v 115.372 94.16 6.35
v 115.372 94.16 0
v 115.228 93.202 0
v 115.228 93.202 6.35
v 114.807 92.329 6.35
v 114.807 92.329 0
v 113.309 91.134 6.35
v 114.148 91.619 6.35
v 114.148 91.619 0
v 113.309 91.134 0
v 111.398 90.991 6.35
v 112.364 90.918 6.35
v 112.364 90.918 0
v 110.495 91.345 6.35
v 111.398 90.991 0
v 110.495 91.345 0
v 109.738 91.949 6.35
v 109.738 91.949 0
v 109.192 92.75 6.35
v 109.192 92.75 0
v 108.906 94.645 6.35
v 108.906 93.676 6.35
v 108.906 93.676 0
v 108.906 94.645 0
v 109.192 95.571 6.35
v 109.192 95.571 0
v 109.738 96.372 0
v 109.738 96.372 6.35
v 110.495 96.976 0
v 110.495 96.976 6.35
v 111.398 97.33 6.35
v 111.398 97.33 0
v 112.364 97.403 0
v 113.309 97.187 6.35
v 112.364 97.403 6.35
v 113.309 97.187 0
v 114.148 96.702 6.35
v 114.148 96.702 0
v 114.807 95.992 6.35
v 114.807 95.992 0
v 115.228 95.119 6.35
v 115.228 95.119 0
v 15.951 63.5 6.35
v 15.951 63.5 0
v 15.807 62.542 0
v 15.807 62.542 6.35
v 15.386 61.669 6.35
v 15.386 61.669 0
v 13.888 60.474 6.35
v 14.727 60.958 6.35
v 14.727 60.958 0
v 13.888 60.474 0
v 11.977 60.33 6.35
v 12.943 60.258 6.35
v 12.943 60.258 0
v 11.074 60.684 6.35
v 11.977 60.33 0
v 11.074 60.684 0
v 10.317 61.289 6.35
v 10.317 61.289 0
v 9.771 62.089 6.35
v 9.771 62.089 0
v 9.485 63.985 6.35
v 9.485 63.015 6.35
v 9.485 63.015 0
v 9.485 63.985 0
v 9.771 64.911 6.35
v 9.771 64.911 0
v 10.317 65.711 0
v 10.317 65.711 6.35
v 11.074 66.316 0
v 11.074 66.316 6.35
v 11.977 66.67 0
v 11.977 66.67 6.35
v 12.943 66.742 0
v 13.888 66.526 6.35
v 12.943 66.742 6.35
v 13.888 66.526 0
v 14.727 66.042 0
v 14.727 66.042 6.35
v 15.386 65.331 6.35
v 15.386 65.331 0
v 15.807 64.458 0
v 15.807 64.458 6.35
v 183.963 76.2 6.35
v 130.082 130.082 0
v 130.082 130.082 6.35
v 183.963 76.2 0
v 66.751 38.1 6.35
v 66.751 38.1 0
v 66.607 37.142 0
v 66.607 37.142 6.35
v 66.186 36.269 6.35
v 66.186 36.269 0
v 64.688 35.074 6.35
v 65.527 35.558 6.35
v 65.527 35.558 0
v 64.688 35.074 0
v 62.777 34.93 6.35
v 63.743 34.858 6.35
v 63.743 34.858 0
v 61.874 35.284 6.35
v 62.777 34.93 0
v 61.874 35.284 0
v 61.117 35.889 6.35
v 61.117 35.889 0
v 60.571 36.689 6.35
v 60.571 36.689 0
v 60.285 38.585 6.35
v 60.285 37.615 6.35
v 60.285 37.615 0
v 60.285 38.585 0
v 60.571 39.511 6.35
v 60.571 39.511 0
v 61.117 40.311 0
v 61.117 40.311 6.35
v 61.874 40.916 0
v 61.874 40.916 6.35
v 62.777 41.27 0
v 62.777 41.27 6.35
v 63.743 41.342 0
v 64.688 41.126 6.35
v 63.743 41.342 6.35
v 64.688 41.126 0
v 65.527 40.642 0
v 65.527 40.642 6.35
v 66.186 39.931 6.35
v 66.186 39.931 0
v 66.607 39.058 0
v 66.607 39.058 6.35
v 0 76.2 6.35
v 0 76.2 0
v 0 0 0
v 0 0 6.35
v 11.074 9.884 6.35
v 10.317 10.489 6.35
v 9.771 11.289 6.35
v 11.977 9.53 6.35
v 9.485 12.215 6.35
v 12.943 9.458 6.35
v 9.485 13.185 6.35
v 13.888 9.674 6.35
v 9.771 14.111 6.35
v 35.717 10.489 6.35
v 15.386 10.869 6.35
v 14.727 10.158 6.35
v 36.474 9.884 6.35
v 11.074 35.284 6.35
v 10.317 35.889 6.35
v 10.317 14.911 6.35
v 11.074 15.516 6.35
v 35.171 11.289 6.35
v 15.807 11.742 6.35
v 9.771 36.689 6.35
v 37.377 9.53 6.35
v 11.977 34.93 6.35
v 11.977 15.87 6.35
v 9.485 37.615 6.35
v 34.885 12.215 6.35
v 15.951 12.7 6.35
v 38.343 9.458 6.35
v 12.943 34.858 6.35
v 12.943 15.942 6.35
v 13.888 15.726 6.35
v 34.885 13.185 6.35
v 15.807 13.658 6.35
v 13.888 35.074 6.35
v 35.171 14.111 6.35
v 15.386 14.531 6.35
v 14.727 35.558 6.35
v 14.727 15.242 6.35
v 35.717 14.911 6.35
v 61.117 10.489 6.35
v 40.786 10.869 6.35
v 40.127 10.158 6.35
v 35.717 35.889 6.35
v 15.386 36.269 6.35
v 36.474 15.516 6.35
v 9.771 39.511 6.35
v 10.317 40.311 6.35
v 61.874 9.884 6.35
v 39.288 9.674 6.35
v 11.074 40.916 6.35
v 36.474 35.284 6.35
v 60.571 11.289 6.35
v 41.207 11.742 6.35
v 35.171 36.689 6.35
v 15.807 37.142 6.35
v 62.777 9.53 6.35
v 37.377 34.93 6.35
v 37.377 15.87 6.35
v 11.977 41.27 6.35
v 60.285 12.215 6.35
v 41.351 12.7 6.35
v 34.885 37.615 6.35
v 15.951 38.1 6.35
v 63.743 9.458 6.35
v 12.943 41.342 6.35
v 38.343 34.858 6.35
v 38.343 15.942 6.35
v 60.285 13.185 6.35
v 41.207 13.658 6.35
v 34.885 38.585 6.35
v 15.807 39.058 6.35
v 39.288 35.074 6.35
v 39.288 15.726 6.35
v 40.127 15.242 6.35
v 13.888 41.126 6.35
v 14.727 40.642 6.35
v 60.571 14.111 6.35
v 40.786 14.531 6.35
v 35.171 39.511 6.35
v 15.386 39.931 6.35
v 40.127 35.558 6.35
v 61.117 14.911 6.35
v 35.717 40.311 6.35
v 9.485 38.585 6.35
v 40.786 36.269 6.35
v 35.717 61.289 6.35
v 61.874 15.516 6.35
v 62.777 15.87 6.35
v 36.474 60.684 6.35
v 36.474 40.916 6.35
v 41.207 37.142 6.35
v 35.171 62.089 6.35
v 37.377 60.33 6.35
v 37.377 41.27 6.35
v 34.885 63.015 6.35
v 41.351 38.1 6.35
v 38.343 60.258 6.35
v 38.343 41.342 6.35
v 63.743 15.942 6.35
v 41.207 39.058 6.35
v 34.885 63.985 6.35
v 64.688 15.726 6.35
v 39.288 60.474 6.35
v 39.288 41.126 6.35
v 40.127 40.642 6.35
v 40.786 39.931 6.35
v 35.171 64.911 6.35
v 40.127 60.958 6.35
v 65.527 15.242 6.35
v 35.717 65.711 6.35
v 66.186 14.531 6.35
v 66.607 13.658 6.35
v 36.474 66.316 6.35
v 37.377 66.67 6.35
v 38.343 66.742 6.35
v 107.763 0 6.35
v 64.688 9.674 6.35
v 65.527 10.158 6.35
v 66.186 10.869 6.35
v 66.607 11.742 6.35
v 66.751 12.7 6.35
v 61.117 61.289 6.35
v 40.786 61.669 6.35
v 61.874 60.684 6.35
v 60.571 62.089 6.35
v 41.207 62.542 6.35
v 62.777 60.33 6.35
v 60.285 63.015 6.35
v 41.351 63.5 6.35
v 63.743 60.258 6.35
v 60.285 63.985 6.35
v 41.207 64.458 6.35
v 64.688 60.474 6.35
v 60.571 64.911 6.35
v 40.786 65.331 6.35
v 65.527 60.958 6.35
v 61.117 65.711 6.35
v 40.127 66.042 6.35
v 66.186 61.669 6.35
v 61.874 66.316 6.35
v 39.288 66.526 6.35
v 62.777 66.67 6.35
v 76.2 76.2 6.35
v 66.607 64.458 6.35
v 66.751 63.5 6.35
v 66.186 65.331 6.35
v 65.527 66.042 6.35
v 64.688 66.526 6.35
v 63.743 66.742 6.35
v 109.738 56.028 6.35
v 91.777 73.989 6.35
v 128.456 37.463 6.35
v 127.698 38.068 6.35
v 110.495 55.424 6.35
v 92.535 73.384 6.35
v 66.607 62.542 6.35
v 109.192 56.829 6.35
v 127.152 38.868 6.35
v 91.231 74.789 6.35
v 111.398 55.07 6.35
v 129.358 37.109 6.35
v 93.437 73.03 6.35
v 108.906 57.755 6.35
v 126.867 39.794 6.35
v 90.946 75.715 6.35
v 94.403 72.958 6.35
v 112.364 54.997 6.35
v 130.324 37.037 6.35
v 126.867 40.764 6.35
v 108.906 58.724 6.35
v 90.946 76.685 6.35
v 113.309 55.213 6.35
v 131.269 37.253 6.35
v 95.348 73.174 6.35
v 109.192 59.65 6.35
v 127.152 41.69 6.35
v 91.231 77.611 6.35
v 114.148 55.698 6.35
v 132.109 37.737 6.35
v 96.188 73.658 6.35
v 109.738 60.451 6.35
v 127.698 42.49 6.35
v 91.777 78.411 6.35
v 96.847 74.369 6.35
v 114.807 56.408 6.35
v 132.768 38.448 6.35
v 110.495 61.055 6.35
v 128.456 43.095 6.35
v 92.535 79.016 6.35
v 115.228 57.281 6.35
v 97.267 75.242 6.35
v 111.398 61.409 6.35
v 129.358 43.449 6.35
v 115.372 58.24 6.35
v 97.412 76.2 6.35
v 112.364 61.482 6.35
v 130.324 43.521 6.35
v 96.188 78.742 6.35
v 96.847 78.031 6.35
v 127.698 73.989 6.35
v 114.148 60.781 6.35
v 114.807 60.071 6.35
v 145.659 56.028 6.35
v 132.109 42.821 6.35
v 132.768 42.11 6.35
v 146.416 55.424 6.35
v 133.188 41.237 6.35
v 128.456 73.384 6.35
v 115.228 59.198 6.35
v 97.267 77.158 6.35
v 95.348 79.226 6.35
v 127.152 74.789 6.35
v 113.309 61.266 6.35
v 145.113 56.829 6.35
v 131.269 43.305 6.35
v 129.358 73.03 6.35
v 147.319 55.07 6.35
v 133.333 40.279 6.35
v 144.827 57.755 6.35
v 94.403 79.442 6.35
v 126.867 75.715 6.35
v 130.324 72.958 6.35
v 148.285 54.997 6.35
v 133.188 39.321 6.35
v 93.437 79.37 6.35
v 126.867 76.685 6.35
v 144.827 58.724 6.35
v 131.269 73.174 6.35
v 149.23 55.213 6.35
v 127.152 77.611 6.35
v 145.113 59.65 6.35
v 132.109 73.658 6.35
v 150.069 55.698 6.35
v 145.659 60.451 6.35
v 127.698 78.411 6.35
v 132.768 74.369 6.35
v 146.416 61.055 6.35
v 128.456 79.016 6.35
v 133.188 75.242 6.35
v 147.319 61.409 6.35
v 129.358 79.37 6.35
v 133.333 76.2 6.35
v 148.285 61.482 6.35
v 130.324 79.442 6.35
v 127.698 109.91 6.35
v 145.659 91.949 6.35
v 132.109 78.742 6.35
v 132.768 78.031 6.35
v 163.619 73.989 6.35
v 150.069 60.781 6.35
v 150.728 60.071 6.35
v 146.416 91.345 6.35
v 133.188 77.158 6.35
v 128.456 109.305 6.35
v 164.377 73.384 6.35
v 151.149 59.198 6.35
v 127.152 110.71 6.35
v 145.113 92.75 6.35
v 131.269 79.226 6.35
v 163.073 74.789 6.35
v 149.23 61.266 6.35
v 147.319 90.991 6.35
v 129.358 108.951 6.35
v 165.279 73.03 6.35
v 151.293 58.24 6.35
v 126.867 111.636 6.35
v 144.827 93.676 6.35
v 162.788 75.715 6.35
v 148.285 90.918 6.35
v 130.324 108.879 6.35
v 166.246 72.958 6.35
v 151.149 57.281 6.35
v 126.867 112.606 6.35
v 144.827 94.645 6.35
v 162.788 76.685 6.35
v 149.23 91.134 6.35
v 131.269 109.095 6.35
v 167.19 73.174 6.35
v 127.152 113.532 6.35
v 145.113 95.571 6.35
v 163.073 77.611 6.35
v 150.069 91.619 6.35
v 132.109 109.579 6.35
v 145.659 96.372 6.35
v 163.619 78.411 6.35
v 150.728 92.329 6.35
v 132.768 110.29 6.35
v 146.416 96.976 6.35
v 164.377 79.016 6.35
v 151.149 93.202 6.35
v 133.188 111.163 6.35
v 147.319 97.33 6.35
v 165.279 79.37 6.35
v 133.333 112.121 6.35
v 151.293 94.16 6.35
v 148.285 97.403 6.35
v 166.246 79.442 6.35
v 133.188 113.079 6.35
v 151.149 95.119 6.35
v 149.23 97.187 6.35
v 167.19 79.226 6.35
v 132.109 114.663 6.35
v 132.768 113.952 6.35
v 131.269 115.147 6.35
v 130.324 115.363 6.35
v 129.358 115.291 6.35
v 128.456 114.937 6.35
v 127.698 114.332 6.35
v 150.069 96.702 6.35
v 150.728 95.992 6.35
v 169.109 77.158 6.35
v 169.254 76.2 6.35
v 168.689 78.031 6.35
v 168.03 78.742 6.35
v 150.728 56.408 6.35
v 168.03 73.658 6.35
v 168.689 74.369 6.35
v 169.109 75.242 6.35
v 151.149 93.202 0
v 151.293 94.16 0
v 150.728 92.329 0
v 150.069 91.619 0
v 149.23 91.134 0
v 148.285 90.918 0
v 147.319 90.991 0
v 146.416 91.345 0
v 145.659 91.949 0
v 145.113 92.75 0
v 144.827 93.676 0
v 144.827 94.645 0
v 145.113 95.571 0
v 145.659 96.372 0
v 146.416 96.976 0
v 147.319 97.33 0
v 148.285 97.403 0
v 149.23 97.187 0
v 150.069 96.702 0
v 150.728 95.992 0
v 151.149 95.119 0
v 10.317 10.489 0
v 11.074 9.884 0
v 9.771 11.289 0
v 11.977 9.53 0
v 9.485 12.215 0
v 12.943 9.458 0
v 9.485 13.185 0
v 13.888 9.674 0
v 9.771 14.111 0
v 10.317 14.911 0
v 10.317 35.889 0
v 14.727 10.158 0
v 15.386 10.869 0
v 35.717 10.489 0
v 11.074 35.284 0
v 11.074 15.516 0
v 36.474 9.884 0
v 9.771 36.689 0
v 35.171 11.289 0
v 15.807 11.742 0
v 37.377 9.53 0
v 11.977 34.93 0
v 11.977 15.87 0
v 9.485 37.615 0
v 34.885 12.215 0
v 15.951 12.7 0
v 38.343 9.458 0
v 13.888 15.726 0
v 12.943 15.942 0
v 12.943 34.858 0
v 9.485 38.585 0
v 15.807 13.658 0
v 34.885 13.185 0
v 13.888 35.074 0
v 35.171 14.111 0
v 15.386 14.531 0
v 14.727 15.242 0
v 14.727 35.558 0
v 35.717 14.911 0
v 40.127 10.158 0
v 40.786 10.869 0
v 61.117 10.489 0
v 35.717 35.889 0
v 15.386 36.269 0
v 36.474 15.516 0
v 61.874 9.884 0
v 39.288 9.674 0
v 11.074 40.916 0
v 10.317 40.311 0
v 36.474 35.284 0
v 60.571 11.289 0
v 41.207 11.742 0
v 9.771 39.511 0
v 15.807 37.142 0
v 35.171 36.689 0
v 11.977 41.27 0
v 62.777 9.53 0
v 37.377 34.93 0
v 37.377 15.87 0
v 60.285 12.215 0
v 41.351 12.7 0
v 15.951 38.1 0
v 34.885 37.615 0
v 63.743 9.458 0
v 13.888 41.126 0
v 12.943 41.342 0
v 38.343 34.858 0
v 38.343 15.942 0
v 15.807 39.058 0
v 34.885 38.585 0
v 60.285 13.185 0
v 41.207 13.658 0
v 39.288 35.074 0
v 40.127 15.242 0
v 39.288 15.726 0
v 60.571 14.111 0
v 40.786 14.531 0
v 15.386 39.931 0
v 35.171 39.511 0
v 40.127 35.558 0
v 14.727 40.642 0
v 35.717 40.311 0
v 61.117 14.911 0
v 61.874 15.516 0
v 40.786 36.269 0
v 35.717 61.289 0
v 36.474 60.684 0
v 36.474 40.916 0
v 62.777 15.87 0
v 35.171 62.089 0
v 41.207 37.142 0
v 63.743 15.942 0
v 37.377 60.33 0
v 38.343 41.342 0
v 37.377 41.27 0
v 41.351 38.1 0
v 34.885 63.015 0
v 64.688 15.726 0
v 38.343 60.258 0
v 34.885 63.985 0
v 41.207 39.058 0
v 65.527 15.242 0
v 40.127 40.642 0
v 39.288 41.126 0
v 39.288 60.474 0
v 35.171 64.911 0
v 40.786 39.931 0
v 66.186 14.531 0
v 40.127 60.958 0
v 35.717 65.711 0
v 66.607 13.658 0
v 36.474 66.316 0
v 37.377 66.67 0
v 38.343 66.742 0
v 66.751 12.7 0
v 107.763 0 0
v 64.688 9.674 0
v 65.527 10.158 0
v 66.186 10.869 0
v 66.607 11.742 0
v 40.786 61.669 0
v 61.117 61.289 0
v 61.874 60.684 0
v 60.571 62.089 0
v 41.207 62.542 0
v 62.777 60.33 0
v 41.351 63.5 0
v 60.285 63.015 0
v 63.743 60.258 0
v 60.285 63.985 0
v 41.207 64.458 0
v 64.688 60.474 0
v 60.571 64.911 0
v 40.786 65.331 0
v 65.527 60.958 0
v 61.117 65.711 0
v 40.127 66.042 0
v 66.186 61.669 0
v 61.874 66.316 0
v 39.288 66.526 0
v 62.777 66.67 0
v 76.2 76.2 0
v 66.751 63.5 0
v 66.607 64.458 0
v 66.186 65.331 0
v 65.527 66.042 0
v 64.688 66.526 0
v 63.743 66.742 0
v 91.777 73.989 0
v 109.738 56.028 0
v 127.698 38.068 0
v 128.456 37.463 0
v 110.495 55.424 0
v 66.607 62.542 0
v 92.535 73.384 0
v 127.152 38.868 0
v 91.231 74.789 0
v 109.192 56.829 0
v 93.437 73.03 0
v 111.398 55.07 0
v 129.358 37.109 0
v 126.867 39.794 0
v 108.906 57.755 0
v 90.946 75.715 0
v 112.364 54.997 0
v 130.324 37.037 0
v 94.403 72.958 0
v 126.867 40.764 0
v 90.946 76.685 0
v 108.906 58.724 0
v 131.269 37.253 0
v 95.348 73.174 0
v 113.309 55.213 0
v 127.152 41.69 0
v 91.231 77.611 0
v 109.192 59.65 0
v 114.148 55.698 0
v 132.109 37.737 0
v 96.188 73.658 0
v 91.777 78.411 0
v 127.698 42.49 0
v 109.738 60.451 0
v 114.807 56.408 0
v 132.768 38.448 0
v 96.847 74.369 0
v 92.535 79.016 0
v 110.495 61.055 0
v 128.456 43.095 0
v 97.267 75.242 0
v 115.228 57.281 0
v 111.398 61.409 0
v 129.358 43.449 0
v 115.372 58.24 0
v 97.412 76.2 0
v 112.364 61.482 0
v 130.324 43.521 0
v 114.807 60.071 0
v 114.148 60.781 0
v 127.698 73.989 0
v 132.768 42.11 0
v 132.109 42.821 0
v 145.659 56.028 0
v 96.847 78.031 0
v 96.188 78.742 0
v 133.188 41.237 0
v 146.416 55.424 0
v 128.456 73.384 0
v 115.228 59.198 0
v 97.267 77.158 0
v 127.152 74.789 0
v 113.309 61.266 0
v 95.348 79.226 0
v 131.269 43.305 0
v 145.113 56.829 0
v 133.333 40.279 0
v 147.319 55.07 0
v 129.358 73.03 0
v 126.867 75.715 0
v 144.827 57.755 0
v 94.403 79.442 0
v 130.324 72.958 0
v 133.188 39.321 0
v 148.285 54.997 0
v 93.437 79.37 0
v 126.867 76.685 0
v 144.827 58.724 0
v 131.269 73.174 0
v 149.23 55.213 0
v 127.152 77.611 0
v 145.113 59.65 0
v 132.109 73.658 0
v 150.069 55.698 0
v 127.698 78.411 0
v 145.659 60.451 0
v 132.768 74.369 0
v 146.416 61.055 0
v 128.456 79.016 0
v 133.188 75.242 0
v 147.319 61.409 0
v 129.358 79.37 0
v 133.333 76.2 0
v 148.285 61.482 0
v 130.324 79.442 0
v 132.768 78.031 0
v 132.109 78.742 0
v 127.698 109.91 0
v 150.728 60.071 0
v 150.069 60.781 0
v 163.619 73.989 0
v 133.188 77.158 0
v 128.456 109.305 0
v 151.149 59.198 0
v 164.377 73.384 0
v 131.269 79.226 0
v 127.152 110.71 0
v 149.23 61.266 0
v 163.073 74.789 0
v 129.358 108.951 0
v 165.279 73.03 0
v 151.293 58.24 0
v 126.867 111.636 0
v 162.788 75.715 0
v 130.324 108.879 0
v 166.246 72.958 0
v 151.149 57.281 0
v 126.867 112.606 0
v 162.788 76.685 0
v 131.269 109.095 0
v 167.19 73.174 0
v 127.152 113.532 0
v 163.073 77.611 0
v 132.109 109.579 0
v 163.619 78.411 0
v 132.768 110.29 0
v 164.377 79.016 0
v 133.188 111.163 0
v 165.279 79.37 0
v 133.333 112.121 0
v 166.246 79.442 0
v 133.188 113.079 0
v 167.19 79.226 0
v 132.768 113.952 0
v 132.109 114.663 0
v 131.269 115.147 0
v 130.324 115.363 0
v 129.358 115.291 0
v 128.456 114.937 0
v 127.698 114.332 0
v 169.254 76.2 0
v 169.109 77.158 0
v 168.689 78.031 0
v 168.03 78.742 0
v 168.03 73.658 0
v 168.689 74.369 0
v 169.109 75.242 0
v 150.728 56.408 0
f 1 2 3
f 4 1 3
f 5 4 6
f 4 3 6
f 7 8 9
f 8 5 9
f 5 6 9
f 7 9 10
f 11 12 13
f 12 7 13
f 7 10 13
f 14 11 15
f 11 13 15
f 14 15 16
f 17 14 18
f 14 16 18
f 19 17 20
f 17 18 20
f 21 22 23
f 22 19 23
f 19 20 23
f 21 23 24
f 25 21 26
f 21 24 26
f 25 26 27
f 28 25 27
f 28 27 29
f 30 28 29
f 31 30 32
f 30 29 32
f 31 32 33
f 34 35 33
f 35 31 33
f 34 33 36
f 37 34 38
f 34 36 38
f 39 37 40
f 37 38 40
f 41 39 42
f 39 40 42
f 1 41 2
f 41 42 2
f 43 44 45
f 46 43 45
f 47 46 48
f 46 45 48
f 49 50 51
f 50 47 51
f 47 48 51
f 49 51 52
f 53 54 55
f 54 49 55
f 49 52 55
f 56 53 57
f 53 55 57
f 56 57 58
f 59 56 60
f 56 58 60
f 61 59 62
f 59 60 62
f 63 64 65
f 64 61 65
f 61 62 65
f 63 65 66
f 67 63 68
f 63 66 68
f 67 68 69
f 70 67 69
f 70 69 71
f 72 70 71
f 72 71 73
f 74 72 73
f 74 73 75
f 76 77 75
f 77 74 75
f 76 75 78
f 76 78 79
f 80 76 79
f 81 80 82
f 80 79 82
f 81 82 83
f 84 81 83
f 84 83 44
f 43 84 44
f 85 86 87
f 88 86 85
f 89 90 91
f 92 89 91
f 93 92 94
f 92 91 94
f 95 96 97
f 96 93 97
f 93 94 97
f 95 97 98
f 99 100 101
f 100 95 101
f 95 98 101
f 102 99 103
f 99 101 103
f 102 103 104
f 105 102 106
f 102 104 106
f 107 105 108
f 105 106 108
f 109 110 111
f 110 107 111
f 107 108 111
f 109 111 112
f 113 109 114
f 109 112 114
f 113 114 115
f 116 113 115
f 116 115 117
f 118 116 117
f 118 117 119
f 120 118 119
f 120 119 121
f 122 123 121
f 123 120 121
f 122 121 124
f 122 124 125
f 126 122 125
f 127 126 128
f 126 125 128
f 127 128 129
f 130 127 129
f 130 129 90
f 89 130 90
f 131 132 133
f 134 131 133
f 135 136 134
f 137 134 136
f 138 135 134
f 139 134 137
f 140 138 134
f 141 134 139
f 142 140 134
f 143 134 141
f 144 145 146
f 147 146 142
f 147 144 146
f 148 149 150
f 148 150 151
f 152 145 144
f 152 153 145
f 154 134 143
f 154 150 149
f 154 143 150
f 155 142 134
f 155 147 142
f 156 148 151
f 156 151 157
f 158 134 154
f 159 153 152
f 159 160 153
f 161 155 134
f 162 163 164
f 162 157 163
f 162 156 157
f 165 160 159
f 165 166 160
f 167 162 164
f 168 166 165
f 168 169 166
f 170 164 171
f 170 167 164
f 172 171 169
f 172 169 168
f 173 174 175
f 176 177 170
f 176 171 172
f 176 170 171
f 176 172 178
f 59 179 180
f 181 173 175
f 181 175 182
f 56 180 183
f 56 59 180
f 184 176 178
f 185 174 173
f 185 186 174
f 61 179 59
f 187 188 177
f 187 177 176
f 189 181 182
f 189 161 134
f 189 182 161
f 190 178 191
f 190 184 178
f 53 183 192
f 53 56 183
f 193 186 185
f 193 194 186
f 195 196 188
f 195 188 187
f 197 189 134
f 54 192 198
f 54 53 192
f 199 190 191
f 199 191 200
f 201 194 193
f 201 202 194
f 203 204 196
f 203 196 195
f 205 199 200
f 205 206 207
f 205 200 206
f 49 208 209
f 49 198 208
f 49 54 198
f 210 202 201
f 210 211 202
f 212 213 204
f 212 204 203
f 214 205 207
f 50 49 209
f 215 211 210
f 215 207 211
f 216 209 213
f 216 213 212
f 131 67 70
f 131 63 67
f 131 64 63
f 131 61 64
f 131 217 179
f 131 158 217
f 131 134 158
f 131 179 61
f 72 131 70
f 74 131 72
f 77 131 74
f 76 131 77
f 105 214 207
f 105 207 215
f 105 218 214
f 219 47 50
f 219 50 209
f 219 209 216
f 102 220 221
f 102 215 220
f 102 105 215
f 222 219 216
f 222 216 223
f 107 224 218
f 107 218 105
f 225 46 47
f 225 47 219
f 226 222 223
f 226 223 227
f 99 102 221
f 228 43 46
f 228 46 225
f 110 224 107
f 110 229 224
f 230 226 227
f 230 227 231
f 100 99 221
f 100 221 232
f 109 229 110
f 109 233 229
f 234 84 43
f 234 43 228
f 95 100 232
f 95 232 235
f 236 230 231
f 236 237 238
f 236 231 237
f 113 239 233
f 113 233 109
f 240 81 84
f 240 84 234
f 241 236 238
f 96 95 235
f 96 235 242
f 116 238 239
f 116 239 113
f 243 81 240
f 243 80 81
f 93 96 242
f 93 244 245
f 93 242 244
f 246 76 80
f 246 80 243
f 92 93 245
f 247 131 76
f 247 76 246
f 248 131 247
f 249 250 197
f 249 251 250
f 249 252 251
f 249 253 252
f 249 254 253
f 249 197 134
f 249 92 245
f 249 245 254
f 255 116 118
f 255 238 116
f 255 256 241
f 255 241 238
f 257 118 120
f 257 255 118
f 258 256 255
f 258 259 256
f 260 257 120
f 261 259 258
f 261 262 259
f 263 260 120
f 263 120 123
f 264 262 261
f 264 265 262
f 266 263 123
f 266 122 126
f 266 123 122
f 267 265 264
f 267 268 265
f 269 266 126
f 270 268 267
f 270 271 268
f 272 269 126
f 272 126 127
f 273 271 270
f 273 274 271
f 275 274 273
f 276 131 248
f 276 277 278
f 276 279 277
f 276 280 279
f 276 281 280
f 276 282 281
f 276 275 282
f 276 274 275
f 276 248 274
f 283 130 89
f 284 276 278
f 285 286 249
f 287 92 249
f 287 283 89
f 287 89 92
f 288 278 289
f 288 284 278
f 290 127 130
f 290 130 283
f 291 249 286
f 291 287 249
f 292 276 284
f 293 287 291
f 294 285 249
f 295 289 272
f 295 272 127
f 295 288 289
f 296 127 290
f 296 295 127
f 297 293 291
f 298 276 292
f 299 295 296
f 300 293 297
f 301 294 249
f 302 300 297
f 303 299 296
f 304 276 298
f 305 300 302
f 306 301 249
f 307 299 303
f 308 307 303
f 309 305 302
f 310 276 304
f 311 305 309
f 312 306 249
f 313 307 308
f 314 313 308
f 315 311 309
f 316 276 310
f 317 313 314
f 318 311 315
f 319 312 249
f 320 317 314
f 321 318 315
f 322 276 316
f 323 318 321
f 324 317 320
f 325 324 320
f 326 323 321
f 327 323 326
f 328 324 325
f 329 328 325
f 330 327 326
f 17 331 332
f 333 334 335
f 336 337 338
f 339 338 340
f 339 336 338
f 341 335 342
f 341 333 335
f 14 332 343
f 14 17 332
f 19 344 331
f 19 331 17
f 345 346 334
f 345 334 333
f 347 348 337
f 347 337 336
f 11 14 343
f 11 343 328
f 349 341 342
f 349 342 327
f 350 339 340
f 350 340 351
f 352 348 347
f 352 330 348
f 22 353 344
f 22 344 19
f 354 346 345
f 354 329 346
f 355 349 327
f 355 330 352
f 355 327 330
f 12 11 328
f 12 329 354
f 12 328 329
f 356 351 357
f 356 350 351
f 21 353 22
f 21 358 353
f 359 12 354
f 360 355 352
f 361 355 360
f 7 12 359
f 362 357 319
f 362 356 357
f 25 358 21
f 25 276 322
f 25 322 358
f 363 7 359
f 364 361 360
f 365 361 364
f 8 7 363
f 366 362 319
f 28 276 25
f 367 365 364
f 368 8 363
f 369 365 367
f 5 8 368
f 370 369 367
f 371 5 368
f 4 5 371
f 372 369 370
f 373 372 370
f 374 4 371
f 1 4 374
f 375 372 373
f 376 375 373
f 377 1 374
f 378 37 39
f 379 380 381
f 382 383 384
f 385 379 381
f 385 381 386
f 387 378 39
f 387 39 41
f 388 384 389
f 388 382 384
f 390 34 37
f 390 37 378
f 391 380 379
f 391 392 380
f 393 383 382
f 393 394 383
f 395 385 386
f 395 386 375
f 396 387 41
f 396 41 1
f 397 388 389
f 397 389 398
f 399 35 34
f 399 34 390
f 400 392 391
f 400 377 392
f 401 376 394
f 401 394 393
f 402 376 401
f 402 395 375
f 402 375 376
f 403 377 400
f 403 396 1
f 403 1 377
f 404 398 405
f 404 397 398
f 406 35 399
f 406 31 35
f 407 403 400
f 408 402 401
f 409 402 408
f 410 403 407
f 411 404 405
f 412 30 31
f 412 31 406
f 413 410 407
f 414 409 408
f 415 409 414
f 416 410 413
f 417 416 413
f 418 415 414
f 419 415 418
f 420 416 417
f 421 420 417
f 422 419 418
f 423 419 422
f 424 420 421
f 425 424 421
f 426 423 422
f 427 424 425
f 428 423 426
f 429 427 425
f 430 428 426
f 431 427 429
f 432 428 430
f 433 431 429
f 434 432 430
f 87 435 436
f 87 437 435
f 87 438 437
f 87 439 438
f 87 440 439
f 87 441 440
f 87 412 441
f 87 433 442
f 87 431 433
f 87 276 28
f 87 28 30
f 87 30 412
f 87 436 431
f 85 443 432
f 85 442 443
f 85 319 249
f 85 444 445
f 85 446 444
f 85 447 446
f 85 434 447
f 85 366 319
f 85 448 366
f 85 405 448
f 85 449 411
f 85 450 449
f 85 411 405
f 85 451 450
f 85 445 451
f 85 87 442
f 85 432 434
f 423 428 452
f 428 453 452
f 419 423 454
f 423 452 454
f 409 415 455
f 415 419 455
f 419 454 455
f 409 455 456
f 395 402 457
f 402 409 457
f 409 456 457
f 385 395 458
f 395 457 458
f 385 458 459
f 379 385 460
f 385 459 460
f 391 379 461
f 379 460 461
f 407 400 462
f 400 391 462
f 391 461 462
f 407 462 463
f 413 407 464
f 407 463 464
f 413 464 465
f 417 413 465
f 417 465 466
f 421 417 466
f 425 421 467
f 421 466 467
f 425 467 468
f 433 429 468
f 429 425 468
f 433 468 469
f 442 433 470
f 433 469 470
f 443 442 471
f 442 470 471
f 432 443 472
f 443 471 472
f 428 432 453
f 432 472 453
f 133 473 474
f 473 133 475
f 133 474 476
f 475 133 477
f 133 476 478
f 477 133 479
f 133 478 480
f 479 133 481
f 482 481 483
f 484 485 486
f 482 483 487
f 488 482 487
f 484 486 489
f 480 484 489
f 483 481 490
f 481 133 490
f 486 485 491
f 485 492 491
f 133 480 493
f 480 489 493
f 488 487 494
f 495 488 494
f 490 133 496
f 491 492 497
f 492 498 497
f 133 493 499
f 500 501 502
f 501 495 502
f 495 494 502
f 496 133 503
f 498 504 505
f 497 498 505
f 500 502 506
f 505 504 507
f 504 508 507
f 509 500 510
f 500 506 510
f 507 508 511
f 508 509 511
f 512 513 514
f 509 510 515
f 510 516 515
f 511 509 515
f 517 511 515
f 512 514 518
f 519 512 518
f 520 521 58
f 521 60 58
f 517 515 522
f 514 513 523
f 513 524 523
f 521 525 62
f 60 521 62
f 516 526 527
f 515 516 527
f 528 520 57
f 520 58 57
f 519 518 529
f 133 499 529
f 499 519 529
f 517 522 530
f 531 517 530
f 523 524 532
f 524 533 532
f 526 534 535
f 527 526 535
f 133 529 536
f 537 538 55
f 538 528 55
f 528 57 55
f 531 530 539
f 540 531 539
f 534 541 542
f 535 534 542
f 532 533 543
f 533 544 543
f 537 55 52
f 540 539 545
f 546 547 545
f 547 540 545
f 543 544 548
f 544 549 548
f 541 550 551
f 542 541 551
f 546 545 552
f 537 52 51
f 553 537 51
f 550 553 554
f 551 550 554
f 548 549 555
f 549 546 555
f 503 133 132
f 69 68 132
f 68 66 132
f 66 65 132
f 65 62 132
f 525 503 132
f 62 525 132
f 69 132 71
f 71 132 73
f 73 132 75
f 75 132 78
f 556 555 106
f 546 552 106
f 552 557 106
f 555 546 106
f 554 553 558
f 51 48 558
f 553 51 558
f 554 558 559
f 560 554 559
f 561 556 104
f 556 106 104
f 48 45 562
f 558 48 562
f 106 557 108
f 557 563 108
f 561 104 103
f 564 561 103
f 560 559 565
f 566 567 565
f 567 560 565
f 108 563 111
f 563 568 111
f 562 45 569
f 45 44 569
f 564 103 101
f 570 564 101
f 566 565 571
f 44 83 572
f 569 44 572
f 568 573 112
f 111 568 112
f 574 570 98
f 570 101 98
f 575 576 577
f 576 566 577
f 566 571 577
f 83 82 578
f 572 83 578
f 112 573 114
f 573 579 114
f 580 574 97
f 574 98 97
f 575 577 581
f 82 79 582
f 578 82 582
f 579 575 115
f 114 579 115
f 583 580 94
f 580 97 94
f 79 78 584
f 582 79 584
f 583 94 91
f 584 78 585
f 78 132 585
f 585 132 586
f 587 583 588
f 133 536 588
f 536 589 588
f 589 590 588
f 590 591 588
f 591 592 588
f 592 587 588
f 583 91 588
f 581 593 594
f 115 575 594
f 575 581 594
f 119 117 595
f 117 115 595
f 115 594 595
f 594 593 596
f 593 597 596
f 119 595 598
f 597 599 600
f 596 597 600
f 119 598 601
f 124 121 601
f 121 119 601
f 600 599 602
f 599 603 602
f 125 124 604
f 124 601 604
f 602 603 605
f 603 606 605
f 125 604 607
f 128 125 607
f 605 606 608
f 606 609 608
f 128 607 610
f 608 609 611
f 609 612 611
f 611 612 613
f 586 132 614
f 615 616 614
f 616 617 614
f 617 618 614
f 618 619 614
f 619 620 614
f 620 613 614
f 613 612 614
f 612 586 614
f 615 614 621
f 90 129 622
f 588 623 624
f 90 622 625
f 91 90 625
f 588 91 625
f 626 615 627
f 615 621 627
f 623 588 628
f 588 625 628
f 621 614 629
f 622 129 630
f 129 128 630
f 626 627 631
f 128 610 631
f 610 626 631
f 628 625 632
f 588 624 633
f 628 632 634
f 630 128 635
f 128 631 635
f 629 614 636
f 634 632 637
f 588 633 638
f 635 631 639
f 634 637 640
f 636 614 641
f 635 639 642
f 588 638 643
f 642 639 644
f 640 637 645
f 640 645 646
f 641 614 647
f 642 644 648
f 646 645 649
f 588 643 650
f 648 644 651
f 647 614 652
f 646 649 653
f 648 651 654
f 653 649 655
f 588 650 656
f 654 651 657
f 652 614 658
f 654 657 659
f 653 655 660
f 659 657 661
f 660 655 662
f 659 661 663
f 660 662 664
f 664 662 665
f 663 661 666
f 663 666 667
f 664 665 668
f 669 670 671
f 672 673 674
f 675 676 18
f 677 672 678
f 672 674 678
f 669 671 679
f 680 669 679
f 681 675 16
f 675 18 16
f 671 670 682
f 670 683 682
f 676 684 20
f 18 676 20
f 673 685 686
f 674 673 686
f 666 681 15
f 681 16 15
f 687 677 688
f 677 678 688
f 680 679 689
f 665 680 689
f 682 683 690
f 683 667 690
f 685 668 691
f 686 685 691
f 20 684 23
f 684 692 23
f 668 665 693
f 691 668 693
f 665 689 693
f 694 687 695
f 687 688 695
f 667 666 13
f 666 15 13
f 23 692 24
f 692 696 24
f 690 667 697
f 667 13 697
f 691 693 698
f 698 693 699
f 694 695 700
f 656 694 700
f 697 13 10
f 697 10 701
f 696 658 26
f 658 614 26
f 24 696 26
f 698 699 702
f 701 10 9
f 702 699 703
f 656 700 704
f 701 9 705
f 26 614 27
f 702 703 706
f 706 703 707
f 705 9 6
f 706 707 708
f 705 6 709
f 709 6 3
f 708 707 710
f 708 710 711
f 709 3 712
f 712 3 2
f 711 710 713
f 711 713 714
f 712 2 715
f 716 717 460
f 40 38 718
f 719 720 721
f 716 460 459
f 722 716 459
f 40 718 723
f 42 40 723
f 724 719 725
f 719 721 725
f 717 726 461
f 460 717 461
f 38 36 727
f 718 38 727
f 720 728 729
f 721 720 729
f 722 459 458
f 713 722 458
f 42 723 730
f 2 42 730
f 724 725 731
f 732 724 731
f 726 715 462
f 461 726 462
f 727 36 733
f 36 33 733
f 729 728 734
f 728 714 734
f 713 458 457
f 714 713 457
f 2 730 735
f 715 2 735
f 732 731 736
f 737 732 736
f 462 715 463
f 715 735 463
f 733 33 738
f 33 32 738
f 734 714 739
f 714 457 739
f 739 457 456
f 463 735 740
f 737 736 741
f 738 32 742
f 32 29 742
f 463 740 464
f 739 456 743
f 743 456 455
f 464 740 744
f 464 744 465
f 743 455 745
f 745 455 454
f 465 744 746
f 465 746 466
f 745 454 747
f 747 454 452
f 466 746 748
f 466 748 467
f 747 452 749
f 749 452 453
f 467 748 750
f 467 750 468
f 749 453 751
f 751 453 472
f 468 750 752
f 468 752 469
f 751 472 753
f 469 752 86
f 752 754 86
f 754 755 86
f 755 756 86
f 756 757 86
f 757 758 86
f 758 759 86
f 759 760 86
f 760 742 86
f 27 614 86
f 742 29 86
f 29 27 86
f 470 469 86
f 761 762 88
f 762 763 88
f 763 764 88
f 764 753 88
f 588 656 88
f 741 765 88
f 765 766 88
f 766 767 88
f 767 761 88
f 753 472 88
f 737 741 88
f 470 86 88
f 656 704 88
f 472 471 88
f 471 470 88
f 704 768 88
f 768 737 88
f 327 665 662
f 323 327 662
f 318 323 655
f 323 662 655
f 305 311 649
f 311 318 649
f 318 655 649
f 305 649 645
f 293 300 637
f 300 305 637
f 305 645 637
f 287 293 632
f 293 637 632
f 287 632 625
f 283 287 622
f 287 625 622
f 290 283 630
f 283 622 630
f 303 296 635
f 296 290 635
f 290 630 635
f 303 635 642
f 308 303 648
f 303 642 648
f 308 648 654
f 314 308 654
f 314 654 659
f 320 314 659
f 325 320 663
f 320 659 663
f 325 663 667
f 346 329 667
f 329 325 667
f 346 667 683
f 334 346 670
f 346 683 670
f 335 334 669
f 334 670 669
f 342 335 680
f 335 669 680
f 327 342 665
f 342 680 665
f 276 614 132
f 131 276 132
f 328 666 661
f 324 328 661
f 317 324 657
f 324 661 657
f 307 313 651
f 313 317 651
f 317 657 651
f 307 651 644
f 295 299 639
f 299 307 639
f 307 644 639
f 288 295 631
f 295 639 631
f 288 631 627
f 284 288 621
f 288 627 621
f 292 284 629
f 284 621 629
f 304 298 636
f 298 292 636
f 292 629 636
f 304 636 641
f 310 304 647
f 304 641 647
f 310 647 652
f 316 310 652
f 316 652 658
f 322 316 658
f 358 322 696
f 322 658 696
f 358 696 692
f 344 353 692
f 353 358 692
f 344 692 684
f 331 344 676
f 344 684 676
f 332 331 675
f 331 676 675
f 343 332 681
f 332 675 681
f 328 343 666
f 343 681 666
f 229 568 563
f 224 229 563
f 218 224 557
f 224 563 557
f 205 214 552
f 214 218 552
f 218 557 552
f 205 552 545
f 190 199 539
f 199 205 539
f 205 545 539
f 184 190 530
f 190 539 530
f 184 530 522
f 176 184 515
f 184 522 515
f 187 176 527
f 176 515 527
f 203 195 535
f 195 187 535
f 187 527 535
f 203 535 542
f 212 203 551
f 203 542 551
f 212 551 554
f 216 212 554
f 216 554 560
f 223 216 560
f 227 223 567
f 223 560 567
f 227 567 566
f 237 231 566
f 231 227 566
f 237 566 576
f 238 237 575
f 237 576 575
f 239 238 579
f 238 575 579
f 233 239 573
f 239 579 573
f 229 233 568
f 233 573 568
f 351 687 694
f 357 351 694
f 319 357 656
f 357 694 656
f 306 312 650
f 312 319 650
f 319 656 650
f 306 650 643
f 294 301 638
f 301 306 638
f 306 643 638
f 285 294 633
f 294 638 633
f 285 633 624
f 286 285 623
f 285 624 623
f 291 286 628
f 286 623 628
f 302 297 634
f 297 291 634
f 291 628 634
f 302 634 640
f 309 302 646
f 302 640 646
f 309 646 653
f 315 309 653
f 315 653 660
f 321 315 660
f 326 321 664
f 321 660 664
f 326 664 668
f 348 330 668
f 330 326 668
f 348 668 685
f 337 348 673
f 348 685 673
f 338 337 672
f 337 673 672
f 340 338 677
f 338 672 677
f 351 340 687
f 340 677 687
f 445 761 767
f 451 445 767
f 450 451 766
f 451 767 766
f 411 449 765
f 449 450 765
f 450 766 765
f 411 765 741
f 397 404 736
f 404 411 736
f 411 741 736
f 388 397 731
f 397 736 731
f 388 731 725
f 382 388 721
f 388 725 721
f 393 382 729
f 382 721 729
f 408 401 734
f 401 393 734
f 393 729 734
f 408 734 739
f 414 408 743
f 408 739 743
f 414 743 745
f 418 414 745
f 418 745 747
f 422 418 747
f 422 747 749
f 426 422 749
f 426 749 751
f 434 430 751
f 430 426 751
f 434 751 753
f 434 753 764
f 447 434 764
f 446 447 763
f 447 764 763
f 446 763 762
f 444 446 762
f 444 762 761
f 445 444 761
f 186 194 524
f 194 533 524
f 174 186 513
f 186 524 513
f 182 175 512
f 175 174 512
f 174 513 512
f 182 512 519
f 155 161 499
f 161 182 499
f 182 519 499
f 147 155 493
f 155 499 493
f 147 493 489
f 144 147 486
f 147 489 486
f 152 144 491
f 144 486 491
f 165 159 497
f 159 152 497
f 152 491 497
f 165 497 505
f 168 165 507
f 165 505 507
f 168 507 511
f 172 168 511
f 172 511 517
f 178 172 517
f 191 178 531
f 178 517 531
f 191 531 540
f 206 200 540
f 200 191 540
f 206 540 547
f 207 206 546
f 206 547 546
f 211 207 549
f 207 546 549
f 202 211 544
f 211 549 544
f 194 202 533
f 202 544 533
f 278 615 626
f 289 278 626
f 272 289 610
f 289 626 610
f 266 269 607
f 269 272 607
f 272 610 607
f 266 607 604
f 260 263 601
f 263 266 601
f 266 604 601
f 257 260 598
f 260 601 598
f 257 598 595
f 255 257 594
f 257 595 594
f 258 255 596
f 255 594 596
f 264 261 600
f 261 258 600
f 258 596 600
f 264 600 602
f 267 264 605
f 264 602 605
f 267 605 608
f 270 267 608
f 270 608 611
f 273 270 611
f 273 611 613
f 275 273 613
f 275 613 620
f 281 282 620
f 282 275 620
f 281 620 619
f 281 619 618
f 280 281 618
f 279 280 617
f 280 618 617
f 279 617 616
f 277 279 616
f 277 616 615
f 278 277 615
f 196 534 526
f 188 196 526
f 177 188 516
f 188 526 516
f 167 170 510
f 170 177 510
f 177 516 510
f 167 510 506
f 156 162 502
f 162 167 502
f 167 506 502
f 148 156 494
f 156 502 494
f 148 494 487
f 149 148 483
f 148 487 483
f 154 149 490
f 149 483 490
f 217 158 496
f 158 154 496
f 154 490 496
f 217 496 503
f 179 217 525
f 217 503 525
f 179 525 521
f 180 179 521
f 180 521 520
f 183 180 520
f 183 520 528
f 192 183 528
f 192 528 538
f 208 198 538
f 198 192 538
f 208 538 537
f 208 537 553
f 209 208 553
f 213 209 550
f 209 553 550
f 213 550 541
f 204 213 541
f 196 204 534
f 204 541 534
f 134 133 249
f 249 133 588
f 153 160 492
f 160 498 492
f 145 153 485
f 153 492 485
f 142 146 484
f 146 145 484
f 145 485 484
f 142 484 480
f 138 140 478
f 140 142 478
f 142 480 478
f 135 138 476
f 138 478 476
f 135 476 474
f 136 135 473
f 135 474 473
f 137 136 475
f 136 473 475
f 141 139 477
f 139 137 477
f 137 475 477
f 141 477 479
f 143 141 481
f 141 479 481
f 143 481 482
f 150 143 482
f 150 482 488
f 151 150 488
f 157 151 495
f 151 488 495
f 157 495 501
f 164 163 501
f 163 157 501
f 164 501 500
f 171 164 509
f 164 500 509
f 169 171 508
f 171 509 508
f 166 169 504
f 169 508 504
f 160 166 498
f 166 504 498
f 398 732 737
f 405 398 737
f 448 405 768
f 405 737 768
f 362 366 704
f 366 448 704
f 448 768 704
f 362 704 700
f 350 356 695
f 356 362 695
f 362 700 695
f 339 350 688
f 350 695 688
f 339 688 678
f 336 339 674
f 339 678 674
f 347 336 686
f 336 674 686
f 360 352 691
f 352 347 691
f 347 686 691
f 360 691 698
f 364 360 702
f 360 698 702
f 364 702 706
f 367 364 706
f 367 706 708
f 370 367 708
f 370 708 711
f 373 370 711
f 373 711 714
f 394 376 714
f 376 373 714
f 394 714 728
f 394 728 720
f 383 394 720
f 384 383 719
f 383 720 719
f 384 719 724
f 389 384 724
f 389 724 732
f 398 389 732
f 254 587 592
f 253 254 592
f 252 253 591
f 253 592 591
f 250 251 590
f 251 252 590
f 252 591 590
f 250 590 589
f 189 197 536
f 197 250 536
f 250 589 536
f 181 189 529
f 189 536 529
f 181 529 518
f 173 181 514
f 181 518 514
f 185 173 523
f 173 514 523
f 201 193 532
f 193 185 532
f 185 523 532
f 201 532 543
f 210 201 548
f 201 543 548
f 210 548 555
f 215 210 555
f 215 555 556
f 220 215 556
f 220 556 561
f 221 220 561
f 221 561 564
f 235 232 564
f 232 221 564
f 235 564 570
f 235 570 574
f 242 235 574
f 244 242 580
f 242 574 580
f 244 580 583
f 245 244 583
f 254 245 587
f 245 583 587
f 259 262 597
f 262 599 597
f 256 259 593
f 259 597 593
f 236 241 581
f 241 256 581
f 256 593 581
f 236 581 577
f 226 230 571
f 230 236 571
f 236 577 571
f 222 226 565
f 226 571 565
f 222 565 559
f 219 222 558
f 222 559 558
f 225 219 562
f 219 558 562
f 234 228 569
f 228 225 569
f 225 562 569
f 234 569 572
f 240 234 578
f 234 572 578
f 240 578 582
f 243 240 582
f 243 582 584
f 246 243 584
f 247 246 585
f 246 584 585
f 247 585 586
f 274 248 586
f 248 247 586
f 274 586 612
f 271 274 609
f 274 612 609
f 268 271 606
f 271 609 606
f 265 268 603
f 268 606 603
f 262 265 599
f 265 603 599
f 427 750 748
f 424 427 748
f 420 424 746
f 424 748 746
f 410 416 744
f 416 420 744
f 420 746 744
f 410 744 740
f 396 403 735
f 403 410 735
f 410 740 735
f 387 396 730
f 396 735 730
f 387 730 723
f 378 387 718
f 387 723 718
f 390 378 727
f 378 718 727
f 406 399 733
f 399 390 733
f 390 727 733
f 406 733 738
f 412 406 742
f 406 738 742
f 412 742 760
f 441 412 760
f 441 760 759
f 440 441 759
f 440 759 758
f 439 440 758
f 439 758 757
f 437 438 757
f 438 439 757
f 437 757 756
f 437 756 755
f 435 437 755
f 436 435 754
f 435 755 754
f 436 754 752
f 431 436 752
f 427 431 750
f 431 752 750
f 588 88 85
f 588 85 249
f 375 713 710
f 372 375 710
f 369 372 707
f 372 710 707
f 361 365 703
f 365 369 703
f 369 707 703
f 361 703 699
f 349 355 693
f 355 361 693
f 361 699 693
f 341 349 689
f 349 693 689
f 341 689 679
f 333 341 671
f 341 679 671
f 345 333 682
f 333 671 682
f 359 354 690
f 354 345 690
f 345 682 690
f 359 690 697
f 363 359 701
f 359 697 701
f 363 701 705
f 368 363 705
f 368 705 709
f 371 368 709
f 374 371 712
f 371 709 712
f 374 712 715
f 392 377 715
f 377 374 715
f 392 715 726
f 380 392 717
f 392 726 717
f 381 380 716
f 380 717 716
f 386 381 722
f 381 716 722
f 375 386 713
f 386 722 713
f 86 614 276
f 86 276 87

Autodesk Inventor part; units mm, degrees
ref_plane "YZ Plane" through (0, 0, 0) normal (1, 0, 0) x (0, 1, 0)
ref_plane "XZ Plane" through (0, 0, 0) normal (0, 1, 0) x (-1, 0, 0)
ref_plane "XY Plane" through (0, 0, 0) normal (0, 0, 1) x (1, 0, 0)
sketch "Sketch1" plane through (0, 0, 0) normal (0, 0, 1) x (1, 0, 0)
  line L0 (76.2, 76.2) -> (0, 76.2)
  line L1 (0, 76.2) -> (0, 0)
  line L2 (76.2, 76.2) -> (130.0815, 130.0815)
  line L3 (130.0815, 130.0815) -> (183.9631, 76.2)
  line L4 (0, 0) -> (107.7631, 0)
  line L5 (183.9631, 76.2) -> (107.7631, 0)
  circle A0 centre (12.7, 12.7) radius 3.2512
  circle A1 centre (12.7, 38.1) radius 3.2512
  circle A2 centre (12.7, 63.5) radius 3.2512
  circle A3 centre (38.1, 12.7) radius 3.2512
  circle A4 centre (38.1, 38.1) radius 3.2512
  circle A5 centre (38.1, 63.5) radius 3.2512
  circle A6 centre (63.5, 12.7) radius 3.2512
  circle A7 centre (63.5, 38.1) radius 3.2512
  circle A8 centre (63.5, 63.5) radius 3.2512
  circle A9 centre (166.0026, 76.2) radius 3.2512
  circle A10 centre (148.042, 94.1605) radius 3.2512
  circle A11 centre (130.0815, 112.121) radius 3.2512
  circle A12 centre (148.042, 58.2395) radius 3.2512
  circle A13 centre (130.0815, 76.2) radius 3.2512
  circle A14 centre (112.121, 94.1605) radius 3.2512
  circle A15 centre (130.0815, 40.279) radius 3.2512
  circle A16 centre (112.121, 58.2395) radius 3.2512
  circle A17 centre (94.1605, 76.2) radius 3.2512
  dimension "d5" = 76.2
  dimension "d7" = 76.2
  dimension "d8" = 135
  dimension "d11" = 76.2
  dimension "d12" = 76.2
  dimension "d13" = 76.2
  dimension "d14" = 6.5024
  dimension "d15" = 12.7
  dimension "d16" = 12.7
  dimension "d19" = 25.4
  dimension "d22" = 25.4
  dimension "d25" = 6.5024
  dimension "d26" = 12.7
  dimension "d27" = 12.7
  dimension "d30" = 25.4
  dimension "d33" = 25.4
extrude "Extrusion1" add sketch "Sketch1" along normal blind 6.35
properties part number "3x3 V plate"
